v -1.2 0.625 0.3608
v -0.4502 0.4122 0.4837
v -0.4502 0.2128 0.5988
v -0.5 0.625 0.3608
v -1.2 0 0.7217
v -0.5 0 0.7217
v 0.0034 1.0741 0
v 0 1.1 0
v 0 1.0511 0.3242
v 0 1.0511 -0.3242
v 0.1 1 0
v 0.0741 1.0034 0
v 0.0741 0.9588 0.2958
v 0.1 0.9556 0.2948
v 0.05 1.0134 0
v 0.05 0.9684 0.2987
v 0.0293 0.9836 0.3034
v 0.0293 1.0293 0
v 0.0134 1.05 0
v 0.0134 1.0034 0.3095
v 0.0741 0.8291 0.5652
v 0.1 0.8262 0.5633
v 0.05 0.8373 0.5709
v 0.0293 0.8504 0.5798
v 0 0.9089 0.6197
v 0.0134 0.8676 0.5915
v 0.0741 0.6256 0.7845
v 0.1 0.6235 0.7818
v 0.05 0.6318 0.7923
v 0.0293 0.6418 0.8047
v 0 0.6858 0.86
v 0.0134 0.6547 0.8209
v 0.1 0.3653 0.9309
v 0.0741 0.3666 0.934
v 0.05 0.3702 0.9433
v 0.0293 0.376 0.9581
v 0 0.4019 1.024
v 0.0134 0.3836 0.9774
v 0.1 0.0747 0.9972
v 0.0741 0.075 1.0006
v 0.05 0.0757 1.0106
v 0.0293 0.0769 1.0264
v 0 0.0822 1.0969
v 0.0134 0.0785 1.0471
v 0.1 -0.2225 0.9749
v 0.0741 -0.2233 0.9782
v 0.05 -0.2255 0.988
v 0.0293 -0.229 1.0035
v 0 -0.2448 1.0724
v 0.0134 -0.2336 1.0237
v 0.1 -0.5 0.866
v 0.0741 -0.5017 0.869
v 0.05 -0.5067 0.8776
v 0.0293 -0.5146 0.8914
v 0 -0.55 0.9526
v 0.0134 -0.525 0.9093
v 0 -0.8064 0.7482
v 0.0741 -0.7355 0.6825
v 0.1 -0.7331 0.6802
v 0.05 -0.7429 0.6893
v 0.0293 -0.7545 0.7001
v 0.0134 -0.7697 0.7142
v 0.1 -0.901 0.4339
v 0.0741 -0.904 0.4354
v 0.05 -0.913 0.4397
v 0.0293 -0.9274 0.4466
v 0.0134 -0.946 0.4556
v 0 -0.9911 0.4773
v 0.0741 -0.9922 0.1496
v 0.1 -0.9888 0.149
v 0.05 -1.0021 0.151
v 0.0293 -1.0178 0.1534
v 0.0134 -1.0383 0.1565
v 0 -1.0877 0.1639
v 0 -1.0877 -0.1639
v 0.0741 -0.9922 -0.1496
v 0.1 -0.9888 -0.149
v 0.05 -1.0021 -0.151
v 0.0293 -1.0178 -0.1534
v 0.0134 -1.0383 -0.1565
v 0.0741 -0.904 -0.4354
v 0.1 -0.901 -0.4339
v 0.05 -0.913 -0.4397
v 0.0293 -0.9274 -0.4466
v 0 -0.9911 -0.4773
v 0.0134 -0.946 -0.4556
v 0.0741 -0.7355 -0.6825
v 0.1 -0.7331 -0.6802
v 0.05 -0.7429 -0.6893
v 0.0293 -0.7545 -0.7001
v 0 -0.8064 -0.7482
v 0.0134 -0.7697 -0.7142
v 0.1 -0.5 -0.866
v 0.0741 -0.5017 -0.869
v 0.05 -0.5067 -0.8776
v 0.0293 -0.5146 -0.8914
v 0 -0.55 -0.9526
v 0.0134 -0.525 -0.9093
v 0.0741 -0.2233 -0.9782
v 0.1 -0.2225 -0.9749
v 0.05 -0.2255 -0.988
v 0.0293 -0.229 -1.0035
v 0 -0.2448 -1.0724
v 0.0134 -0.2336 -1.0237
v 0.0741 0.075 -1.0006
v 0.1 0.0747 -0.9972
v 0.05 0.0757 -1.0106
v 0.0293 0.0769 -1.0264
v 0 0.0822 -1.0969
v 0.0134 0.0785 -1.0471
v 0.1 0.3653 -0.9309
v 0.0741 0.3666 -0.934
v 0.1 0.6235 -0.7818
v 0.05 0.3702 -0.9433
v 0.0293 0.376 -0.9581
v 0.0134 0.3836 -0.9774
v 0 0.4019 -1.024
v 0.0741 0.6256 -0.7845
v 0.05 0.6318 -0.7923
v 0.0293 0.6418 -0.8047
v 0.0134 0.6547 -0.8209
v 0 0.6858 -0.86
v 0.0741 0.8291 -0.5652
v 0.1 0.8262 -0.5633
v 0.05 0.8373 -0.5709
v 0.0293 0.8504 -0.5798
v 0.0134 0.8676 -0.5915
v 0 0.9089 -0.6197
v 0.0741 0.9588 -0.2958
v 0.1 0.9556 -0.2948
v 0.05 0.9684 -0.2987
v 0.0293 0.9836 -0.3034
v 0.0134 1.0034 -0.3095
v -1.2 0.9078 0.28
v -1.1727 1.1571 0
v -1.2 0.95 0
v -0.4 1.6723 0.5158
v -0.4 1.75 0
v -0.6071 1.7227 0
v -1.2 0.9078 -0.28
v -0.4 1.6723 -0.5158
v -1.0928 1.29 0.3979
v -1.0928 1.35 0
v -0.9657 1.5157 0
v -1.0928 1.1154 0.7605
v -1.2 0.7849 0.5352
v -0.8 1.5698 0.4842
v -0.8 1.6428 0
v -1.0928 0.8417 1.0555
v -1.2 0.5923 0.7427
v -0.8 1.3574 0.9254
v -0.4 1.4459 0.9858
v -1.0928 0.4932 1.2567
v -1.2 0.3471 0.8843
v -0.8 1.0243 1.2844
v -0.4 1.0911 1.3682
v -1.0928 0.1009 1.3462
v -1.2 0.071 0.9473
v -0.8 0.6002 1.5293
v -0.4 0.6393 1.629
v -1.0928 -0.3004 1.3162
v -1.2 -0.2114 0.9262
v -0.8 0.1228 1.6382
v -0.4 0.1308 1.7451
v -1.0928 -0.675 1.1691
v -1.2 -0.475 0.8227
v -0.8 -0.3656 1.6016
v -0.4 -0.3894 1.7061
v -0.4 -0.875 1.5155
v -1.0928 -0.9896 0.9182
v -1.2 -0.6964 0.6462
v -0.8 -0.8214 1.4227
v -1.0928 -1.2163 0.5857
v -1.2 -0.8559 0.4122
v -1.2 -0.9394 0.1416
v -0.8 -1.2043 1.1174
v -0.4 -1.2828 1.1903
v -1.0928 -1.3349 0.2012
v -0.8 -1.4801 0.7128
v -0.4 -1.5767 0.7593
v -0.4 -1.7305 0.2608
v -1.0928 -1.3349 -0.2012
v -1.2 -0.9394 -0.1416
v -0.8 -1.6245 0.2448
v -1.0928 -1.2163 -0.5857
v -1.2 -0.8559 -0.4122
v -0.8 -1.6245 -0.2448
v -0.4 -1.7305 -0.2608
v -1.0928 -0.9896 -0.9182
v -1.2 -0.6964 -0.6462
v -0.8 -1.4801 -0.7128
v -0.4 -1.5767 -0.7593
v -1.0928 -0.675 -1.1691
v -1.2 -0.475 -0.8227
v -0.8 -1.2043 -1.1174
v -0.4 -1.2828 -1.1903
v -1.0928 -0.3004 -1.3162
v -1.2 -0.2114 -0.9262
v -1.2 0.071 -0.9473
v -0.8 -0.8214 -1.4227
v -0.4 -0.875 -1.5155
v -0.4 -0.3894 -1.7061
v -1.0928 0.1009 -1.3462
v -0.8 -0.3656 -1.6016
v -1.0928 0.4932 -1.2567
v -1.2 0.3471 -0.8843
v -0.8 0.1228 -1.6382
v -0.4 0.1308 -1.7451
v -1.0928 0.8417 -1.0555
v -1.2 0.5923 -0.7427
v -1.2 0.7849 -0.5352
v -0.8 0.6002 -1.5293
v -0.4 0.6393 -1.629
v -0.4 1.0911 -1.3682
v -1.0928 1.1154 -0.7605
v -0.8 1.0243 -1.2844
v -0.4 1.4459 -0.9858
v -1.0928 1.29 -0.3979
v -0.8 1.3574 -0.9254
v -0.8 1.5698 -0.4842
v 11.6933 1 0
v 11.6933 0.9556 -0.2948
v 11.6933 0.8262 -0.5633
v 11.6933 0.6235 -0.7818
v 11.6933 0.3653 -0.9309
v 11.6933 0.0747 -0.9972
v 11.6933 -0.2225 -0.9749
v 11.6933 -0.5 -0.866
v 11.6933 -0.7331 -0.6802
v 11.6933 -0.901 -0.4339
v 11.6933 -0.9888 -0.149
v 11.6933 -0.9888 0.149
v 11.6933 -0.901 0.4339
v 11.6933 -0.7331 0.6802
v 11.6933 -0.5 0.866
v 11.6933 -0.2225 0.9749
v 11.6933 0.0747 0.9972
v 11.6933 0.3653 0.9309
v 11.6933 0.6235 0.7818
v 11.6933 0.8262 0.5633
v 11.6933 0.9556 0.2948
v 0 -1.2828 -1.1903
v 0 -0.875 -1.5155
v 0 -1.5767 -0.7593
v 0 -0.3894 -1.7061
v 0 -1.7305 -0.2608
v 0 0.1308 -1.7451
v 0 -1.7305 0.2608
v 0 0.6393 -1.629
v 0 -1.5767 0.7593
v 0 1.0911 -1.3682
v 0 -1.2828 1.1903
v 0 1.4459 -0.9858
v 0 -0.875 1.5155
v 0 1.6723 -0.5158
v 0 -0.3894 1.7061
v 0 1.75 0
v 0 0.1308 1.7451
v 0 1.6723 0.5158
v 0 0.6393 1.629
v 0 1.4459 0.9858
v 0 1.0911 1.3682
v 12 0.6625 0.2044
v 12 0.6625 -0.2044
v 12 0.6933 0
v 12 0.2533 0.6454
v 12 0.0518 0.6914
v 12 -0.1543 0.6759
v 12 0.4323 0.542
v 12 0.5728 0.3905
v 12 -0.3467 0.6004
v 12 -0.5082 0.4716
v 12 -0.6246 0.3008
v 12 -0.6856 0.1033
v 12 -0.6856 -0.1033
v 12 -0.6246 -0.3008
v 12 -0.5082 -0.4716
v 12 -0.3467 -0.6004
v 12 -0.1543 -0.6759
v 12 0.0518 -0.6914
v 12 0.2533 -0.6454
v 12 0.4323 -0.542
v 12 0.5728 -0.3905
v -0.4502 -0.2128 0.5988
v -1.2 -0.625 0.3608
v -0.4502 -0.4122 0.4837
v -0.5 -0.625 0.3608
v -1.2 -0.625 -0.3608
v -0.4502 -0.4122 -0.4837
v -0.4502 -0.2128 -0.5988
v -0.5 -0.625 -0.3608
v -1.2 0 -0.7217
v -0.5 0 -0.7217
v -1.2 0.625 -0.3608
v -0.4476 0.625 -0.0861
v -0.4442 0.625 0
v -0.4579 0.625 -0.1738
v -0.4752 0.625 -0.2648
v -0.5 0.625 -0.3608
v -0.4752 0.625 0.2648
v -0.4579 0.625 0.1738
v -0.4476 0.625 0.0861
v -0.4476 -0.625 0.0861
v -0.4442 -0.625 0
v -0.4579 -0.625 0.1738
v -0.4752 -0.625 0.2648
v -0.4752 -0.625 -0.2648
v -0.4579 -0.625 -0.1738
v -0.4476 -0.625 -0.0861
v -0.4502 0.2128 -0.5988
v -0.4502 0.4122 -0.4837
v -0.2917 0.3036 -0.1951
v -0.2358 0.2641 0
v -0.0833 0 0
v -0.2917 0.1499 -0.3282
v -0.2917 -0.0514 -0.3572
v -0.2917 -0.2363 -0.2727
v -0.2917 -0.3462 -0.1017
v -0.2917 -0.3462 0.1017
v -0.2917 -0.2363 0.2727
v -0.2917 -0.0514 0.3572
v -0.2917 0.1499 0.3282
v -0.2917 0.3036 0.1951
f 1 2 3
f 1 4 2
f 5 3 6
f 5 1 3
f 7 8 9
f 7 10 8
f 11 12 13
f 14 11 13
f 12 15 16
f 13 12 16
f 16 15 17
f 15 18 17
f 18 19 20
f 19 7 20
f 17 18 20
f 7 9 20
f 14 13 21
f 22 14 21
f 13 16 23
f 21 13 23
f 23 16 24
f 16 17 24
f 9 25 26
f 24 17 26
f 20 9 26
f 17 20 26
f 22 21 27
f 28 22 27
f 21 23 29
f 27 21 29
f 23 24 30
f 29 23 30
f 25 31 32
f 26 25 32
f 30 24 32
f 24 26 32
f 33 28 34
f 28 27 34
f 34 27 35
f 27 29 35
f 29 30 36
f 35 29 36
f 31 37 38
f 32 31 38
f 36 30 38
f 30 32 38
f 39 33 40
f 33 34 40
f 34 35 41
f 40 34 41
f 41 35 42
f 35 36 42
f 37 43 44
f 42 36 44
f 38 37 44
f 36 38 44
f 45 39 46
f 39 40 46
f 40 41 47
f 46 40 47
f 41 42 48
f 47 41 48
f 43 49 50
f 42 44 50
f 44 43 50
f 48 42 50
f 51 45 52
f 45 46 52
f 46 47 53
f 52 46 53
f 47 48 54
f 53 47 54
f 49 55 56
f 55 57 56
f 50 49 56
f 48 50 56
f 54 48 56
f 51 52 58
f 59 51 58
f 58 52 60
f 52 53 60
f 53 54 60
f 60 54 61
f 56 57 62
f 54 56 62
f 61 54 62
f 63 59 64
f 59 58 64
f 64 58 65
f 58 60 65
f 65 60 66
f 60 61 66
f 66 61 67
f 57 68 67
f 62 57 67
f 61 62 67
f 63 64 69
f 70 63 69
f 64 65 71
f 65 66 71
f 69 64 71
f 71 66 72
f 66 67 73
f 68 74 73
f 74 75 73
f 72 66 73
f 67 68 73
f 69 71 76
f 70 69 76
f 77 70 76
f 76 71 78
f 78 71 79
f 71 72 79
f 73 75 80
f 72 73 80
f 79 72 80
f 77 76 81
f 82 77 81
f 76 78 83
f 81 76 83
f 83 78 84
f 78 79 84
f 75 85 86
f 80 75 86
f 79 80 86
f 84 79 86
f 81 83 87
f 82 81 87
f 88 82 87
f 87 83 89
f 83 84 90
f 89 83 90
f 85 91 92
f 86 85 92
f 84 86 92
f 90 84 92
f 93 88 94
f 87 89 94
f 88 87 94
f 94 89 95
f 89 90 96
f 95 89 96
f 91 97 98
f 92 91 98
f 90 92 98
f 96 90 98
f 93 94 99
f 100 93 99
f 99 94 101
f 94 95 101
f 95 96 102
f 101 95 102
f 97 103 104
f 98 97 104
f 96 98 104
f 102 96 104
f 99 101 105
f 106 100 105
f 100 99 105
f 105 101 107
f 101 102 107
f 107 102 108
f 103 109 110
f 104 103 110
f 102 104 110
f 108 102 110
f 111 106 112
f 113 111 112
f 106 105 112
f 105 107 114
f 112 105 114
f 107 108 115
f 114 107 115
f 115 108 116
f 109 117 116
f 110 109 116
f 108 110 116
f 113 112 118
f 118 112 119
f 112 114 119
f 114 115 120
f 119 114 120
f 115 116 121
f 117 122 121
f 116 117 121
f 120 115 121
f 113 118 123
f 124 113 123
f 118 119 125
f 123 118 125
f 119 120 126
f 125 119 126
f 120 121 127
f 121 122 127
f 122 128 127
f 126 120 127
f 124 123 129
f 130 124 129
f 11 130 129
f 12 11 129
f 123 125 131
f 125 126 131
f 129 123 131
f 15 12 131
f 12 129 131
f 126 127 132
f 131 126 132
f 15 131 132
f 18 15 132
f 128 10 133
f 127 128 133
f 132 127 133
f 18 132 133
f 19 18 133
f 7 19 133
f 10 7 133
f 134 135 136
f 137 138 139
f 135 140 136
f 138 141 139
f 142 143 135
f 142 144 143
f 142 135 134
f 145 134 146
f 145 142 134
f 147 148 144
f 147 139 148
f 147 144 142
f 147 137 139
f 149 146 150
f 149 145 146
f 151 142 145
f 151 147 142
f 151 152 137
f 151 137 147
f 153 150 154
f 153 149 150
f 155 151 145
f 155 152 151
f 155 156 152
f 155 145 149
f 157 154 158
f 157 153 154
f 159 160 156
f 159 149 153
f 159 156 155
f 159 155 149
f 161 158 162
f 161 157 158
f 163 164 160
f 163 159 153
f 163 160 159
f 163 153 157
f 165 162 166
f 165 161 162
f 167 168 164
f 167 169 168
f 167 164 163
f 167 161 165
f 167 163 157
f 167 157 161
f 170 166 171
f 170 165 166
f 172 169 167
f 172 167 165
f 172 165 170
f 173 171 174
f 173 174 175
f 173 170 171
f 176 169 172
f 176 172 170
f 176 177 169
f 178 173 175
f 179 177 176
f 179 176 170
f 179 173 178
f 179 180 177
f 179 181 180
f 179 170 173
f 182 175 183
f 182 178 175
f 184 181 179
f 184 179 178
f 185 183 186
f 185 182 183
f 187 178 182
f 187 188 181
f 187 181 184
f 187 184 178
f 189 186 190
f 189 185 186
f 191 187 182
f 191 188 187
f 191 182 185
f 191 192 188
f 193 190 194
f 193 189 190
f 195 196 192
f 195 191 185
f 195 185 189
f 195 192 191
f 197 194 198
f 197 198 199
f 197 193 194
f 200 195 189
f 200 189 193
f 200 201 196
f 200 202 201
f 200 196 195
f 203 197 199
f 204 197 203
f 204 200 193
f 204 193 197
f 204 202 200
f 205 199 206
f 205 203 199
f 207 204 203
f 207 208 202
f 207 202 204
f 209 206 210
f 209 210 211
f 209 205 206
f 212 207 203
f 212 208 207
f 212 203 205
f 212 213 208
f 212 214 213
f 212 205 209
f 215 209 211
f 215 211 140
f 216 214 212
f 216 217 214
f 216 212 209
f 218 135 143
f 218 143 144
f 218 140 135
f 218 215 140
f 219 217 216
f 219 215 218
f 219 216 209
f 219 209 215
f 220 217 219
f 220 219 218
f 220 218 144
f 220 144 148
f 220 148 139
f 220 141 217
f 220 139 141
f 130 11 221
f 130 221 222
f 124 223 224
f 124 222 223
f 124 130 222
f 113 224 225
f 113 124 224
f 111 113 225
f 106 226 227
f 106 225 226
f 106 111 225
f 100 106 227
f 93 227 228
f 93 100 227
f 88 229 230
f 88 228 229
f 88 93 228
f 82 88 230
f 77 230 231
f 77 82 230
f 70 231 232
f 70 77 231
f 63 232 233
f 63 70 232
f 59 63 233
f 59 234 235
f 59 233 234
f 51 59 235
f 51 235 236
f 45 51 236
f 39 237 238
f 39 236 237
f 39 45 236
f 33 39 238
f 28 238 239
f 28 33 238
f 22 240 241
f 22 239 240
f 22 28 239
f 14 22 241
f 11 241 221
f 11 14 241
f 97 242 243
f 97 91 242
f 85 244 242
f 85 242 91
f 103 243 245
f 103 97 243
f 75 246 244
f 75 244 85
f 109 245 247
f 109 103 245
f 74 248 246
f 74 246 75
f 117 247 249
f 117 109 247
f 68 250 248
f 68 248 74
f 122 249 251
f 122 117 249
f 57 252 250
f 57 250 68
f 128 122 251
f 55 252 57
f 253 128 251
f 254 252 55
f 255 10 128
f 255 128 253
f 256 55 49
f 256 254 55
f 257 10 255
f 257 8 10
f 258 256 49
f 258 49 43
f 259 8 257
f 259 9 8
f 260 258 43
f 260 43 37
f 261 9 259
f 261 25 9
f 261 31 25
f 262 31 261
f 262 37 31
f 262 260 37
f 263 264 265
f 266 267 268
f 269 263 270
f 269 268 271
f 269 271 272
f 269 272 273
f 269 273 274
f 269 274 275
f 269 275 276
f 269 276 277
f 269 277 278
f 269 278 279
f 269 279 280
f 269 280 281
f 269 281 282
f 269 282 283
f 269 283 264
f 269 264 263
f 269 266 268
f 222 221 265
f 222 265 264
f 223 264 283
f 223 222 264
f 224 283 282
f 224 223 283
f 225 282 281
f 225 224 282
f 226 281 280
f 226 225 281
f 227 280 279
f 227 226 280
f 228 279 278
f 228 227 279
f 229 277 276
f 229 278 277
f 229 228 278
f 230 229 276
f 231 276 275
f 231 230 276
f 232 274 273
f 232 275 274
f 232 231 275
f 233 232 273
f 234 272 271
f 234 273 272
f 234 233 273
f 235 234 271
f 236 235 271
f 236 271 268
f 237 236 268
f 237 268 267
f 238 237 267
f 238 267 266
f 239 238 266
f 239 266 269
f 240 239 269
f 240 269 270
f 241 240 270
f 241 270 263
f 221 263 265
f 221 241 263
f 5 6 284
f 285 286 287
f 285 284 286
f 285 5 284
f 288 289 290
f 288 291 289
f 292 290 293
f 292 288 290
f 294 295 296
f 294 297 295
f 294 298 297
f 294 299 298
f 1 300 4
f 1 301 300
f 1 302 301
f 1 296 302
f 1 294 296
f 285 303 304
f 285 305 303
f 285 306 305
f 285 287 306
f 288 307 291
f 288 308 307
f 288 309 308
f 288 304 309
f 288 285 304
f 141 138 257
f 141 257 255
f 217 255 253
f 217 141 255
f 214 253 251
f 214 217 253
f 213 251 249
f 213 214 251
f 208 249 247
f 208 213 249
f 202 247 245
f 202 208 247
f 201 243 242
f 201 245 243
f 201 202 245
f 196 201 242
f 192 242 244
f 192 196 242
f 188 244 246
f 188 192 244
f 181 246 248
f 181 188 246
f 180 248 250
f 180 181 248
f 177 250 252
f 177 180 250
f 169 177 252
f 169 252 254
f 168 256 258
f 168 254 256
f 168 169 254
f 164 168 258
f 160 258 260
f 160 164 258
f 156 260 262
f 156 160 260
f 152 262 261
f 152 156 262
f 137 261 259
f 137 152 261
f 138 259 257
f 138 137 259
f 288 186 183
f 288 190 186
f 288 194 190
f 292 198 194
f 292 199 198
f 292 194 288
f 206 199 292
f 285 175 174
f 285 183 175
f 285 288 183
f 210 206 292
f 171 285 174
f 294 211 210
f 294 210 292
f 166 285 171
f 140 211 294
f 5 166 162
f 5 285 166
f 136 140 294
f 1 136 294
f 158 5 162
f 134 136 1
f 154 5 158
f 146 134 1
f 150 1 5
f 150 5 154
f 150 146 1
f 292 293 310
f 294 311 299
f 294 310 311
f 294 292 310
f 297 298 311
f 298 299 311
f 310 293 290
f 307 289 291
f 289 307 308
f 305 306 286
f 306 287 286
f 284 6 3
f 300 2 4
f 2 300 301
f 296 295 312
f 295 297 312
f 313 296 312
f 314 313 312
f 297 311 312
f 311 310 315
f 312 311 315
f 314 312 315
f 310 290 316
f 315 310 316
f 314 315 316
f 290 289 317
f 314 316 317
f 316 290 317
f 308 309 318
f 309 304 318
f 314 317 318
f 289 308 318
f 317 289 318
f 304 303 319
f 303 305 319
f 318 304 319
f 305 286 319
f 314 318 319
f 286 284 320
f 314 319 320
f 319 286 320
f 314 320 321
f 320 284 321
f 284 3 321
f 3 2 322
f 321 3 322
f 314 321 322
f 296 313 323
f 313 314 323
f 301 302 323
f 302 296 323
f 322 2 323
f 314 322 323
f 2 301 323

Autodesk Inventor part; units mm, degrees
ref_plane "YZ Plane" through (0, 0, 0) normal (1, 0, 0) x (0, 1, 0)
ref_plane "XZ Plane" through (0, 0, 0) normal (0, 1, 0) x (-1, 0, 0)
sketch "Sketch1" plane through (0, 0, 0) normal (0, 0, 1) x (1, 0, 0)
  line L0 (-0.0833, 0) -> (12, 0)
  line L1 (12, 0) -> (12, 1)
  line L2 (12, 1) -> (9, 1)
  line L3 (9, 1) -> (8.6932, 1)
  line L4 (8.6932, 1) -> (0, 1)
  line L5 (0, 1) -> (0, 1.75)
  line L6 (0, 1.75) -> (-1.2, 1.75)
  line L7 (-1.2, 1.75) -> (-1.2, 0.7217)
  line L8 (-1.2, 0.7217) -> (-0.5, 0.7217)
  line L9 (-0.5, 0.7217) -> (-0.0833, 0)
  line L10 (-3.84, 0) -> (14.64, 0) projected
  line L11 (0, -0.35) -> (0, 2.1) projected
  line L12 (9, 1) -> (0, 1) construction
  dimension "d1" = 3
  dimension "d2" = 0.3068
  dimension "d3" = 1.2
  dimension "d4" = 0.7
  dimension "d5" = 60
  dimension "d6" = 2
  dimension "d7" = 2
  dimension "d8" = 1.4434
  dimension "d9" = 3.5
  dimension "d26" = 12
revolve "Body" add sketch "Sketch1" angle 360 about axis through (-0.0833, 0, 0) along (1, 0, 0)
sketch "Sketch2" plane through (-1.2, 0, 0) normal (-1, 0, 0) x (0, 0, 1)
  circle A0 centre (0, 0) radius 0.7217 projected
  line L0 (0, -2.45) -> (0, 2.45) projected
  line L1 (-2.45, 0) -> (2.45, 0) projected
  line L2 (0.7217, 0) -> (0.3608, -0.625)
  line L3 (0.3608, -0.625) -> (-0.3608, -0.625)
  line L4 (-0.3608, -0.625) -> (-0.7217, 0)
  line L5 (-0.7217, 0) -> (-0.3608, 0.625)
  line L6 (-0.3608, 0.625) -> (0.3608, 0.625)
  line L7 (0.3608, 0.625) -> (0.7217, 0)
extrude "Slot" add sketch "Sketch2" against normal up to next contours L7 A0 | A0 L2 | L6 L0 A0 | A0 L0 L3 | L0 L6 A0 | A0 L3 L0 | L4 A0 | A0 L5
fillet "Fillet1" radius 0.8 1 edges at (-1.2, -1.75, 0)
chamfer "Chamfer1" distance 0.3067 distance2 0.3067 1 edges at (12, -1, 0) measured on face at (12, -0.02, -0.3842)
ref_plane "Work Plane1" through (29, 0, 0) normal (0, -1, 0) x (1, 0, 0)
fillet "Fillet2" radius 0.1 1 edges at (0, -1, 0)
thread "Thread2" size "M2x0.4" class "6g" standard "ANSI Metric M Profile" full length
equation "\"d15\" = -0.5 * SPD + 0.5 * GD"
equation "\"d16\" = GUL"
equation "\"GD\" = NND"
equation "\"NLG\" = 6"
equation "\"GEL\" = 4.5"
equation "\"KOD\" = 5.7"
equation "\"KOH\" = 1.65"
equation "\"INTI\" = 1.04"
equation "\"GAL\" = 0.61345 * PTC"
equation "\"GUL\" = 0.61345 * PTC"
equation "\"BDM\" = NND"
equation "\"SW\" = 2"
equation "\"RR\" = 1.45"
equation "\"SPD\" = NND - 1.2269 * PTC"
equation "\"R\" = 0.3"
equation "\"TOA\" = 30deg"
equation "\"GD1\" = THREADDIA - 1.2269 * PTC"
equation "\"THREADDIA\" = 3"
equation "\"PTC\" = 0.5"
equation "\"NND\" = 3"
equation "\"KOH1\" = 0.2"
equation "\"E0\" = 2.303"
properties part number "M2x10 Bolt" material "Stainless Steel"
